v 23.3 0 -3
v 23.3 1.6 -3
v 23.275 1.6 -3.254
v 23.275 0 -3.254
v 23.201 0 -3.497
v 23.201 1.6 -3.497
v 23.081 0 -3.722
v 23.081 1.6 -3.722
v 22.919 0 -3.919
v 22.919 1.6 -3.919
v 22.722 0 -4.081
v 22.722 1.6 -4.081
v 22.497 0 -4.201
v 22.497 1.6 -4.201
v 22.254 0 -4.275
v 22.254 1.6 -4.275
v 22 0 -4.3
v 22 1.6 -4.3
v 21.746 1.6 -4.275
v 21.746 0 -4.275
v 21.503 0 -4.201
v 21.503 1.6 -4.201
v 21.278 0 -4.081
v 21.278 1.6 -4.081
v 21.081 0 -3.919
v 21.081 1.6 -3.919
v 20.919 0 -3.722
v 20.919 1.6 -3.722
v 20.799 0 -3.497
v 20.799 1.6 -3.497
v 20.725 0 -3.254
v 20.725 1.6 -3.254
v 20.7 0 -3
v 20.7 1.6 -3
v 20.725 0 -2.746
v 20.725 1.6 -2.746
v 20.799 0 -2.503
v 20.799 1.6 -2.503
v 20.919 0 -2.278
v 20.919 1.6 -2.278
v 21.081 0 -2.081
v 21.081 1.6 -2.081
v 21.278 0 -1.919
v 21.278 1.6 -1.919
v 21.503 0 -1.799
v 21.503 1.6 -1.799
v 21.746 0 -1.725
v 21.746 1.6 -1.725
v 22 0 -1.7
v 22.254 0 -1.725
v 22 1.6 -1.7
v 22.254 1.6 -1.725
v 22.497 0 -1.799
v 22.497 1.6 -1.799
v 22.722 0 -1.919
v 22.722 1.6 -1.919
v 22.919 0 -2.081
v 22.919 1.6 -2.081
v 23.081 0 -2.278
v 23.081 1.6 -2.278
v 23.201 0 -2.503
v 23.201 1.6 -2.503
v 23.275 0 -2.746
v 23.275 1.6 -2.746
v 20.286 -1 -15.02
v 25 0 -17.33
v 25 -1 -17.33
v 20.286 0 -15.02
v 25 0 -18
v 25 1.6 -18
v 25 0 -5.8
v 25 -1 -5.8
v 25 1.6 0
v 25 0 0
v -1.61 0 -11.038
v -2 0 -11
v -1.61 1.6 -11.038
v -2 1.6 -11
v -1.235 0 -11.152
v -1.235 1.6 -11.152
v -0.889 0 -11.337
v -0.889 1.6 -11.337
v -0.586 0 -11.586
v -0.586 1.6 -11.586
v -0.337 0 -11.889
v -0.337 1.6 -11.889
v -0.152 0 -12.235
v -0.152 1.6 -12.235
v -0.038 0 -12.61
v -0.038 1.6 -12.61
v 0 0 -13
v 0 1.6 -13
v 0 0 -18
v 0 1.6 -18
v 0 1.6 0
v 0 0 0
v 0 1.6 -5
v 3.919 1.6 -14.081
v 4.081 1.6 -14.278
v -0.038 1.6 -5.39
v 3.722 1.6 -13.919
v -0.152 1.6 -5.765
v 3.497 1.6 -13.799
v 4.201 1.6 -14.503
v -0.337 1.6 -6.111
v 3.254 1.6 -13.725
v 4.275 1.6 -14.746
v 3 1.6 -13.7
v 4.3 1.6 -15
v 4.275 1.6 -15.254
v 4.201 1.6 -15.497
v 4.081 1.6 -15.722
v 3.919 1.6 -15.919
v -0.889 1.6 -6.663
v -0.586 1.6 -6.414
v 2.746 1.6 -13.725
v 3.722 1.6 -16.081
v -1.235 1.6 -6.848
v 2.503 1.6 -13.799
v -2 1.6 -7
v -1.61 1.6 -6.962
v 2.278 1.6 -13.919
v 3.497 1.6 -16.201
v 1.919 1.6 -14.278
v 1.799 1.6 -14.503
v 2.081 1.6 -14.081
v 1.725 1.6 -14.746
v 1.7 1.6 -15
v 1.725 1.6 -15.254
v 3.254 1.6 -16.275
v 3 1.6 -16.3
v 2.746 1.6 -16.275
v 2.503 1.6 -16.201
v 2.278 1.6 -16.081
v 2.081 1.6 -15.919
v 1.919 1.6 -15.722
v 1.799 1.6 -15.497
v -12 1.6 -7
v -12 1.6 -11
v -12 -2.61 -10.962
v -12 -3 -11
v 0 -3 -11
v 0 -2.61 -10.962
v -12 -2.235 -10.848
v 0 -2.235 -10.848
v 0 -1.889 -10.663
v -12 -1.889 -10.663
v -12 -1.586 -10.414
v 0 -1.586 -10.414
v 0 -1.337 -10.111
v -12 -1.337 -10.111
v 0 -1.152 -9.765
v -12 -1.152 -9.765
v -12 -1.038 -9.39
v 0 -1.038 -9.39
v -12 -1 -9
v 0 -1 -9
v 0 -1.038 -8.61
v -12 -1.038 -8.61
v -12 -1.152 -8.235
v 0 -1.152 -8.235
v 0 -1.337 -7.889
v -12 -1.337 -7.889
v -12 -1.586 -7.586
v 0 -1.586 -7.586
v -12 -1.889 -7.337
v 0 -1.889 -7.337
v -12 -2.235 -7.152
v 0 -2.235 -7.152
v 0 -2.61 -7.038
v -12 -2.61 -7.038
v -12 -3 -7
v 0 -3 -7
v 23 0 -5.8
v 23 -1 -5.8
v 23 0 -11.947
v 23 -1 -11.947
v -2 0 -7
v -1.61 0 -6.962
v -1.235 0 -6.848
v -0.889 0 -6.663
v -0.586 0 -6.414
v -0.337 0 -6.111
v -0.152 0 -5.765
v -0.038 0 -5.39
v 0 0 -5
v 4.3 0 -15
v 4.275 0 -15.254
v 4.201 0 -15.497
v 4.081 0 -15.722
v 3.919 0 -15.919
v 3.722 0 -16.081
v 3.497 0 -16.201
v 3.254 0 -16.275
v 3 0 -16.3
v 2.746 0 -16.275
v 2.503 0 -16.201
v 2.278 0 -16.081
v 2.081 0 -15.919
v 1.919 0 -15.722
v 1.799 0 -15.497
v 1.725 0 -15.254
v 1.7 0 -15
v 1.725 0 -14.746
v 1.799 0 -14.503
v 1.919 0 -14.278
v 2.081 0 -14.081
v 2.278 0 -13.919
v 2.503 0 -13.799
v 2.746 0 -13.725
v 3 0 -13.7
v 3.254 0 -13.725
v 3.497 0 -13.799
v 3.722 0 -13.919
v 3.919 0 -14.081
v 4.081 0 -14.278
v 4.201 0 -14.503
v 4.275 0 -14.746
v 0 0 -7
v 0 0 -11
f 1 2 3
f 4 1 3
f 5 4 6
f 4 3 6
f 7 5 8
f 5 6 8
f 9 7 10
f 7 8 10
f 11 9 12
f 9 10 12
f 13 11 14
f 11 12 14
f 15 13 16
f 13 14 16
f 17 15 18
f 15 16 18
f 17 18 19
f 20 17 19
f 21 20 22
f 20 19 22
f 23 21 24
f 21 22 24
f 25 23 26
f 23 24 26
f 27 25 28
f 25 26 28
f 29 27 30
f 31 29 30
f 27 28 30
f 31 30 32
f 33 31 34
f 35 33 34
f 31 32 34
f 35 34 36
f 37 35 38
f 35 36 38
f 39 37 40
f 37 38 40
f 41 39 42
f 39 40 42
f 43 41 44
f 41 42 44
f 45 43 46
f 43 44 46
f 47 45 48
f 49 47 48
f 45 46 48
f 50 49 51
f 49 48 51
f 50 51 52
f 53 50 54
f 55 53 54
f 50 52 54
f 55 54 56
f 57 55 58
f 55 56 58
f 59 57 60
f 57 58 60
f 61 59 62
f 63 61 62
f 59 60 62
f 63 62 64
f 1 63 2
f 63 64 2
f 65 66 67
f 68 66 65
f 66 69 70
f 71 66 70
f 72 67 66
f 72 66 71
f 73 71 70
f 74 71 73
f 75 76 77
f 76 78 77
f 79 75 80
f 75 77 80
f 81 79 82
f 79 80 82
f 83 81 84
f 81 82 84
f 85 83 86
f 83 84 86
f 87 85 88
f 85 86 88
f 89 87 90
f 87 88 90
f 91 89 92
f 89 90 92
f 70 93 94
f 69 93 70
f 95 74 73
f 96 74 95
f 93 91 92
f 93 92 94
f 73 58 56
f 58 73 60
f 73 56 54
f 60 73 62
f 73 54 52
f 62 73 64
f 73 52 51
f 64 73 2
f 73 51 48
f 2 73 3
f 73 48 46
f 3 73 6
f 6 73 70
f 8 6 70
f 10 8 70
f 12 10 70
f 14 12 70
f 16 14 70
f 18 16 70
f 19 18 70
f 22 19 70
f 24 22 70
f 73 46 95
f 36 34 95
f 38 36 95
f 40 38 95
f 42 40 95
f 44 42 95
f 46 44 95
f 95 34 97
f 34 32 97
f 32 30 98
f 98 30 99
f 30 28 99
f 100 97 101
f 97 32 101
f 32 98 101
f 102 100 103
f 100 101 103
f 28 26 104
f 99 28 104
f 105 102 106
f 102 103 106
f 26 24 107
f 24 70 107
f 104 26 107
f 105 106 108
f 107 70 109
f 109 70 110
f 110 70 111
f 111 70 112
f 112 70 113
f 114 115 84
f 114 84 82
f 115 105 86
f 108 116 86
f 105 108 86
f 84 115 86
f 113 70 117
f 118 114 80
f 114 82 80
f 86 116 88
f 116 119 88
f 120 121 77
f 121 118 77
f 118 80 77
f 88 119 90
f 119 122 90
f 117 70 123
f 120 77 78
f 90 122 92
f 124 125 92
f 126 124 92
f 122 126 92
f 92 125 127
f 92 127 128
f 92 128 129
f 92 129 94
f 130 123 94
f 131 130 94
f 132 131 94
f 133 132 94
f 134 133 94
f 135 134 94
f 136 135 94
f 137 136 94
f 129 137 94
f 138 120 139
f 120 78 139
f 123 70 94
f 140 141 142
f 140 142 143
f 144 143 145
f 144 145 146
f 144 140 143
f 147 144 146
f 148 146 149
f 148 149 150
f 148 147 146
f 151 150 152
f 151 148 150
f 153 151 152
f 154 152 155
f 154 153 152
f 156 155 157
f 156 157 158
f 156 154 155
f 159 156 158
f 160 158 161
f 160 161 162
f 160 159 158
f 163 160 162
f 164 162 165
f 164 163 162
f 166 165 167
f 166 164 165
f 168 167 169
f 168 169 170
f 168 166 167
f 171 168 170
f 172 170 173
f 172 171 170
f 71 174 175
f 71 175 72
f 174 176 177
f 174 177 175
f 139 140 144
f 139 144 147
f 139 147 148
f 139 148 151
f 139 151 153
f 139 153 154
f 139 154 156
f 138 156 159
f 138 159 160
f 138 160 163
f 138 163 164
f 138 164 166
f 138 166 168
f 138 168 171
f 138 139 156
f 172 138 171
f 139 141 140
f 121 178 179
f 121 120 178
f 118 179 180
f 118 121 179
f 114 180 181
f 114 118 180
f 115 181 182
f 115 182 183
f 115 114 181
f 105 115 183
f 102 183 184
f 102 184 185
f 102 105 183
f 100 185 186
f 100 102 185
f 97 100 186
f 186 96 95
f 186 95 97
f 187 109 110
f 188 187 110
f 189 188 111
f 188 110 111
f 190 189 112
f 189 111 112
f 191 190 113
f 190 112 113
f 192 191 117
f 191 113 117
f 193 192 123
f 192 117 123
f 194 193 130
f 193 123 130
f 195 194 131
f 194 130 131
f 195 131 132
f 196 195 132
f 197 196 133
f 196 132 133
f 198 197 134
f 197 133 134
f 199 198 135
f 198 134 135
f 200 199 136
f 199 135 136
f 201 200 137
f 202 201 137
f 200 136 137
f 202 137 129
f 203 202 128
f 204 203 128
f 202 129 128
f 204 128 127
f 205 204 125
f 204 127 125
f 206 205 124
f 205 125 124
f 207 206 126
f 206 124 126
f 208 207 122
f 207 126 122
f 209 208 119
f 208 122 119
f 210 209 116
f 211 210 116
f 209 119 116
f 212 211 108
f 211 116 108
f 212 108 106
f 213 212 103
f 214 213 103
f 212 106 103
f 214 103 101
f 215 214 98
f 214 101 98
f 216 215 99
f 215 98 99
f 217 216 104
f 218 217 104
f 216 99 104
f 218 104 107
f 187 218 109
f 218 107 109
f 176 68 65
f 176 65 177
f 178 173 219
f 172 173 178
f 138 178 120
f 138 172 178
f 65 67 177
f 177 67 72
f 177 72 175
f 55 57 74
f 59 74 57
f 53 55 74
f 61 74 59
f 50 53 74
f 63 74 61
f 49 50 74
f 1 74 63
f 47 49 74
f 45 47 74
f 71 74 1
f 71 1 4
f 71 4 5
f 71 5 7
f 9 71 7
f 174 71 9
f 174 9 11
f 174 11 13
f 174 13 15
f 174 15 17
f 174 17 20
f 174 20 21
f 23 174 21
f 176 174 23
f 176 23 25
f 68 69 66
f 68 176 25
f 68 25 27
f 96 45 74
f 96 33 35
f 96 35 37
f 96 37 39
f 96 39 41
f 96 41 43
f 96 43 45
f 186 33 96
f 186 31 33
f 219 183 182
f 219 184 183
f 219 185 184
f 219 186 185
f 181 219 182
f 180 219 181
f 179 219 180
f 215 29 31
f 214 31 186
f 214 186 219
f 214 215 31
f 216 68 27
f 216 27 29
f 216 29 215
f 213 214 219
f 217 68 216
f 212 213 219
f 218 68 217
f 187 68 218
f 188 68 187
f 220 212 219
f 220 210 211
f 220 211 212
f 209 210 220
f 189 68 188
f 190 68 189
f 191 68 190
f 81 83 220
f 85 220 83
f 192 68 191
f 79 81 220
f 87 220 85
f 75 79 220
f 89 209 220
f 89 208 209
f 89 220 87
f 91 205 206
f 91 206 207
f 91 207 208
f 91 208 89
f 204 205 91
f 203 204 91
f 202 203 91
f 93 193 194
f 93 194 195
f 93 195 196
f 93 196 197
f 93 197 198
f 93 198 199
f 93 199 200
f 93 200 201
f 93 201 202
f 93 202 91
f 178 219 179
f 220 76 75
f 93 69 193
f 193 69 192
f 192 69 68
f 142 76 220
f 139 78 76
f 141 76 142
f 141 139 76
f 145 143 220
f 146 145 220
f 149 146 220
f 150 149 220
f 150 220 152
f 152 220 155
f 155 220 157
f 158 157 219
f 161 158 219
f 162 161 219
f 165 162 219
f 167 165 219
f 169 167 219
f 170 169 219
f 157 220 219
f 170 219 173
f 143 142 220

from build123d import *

# Parameters (mm, degrees)
BOSS_EXTRUDE1_DEPTH = 1.6
BOSS_EXTRUDE2_DEPTH = 12
SKETCH3_R           = 1.3
CUT_EXTRUDE1_DEPTH  = 1.6
FILLET1_R           = 2
BOSS_EXTRUDE3_DEPTH = 1


with BuildPart() as part:
    # Sketch1 → Boss-Extrude1 (new body)
    with BuildSketch(Plane(origin=(0, 0, 0), x_dir=(1, 0, 0), z_dir=(0, 1, 0))):
        Polygon((0, 11), (0, 18), (25, 18), (25, 0), (0, 0), (0, 7), (-12, 7), (-12, 11), align=None)
    extrude(amount=BOSS_EXTRUDE1_DEPTH)

    # Sketch2 → Boss-Extrude2 (add)
    with BuildSketch(Plane.ZY.offset(12)):
        with BuildLine():
            Line((-7, -3), (-7, 0))
            Line((-7, 0), (-11, 0))
            Line((-11, 0), (-11, -3))
            ThreePointArc((-11, -3), (-9, -1), (-7, -3))
        make_face()
    extrude(amount=-BOSS_EXTRUDE2_DEPTH)

    # Sketch3 → Cut-Extrude1 (cut)
    with BuildSketch(Plane(origin=(0, 1.6, 0), x_dir=(1, 0, 0), z_dir=(0, 1, 0))):
        with Locations((3, 15)):
            Circle(SKETCH3_R)
        with Locations((22, 3)):
            Circle(SKETCH3_R)
    extrude(amount=-CUT_EXTRUDE1_DEPTH, mode=Mode.SUBTRACT)

    # Fillet1
    fillet1_edges = [part.edges().sort_by_distance(p)[0] for p in [
        (0, 0.8, -7),
        (0, 0.8, -11),
    ]]
    fillet(fillet1_edges, radius=FILLET1_R)

    # Sketch4 → Boss-Extrude3 (add)
    with BuildSketch(Plane.XZ):
        Polygon((25, -5.8), (25, -17.33), (20.285605544, -15.019808468), (23, -11.947014506), (23, -5.8), align=None)
    extrude(amount=BOSS_EXTRUDE3_DEPTH)


solid = part.part
